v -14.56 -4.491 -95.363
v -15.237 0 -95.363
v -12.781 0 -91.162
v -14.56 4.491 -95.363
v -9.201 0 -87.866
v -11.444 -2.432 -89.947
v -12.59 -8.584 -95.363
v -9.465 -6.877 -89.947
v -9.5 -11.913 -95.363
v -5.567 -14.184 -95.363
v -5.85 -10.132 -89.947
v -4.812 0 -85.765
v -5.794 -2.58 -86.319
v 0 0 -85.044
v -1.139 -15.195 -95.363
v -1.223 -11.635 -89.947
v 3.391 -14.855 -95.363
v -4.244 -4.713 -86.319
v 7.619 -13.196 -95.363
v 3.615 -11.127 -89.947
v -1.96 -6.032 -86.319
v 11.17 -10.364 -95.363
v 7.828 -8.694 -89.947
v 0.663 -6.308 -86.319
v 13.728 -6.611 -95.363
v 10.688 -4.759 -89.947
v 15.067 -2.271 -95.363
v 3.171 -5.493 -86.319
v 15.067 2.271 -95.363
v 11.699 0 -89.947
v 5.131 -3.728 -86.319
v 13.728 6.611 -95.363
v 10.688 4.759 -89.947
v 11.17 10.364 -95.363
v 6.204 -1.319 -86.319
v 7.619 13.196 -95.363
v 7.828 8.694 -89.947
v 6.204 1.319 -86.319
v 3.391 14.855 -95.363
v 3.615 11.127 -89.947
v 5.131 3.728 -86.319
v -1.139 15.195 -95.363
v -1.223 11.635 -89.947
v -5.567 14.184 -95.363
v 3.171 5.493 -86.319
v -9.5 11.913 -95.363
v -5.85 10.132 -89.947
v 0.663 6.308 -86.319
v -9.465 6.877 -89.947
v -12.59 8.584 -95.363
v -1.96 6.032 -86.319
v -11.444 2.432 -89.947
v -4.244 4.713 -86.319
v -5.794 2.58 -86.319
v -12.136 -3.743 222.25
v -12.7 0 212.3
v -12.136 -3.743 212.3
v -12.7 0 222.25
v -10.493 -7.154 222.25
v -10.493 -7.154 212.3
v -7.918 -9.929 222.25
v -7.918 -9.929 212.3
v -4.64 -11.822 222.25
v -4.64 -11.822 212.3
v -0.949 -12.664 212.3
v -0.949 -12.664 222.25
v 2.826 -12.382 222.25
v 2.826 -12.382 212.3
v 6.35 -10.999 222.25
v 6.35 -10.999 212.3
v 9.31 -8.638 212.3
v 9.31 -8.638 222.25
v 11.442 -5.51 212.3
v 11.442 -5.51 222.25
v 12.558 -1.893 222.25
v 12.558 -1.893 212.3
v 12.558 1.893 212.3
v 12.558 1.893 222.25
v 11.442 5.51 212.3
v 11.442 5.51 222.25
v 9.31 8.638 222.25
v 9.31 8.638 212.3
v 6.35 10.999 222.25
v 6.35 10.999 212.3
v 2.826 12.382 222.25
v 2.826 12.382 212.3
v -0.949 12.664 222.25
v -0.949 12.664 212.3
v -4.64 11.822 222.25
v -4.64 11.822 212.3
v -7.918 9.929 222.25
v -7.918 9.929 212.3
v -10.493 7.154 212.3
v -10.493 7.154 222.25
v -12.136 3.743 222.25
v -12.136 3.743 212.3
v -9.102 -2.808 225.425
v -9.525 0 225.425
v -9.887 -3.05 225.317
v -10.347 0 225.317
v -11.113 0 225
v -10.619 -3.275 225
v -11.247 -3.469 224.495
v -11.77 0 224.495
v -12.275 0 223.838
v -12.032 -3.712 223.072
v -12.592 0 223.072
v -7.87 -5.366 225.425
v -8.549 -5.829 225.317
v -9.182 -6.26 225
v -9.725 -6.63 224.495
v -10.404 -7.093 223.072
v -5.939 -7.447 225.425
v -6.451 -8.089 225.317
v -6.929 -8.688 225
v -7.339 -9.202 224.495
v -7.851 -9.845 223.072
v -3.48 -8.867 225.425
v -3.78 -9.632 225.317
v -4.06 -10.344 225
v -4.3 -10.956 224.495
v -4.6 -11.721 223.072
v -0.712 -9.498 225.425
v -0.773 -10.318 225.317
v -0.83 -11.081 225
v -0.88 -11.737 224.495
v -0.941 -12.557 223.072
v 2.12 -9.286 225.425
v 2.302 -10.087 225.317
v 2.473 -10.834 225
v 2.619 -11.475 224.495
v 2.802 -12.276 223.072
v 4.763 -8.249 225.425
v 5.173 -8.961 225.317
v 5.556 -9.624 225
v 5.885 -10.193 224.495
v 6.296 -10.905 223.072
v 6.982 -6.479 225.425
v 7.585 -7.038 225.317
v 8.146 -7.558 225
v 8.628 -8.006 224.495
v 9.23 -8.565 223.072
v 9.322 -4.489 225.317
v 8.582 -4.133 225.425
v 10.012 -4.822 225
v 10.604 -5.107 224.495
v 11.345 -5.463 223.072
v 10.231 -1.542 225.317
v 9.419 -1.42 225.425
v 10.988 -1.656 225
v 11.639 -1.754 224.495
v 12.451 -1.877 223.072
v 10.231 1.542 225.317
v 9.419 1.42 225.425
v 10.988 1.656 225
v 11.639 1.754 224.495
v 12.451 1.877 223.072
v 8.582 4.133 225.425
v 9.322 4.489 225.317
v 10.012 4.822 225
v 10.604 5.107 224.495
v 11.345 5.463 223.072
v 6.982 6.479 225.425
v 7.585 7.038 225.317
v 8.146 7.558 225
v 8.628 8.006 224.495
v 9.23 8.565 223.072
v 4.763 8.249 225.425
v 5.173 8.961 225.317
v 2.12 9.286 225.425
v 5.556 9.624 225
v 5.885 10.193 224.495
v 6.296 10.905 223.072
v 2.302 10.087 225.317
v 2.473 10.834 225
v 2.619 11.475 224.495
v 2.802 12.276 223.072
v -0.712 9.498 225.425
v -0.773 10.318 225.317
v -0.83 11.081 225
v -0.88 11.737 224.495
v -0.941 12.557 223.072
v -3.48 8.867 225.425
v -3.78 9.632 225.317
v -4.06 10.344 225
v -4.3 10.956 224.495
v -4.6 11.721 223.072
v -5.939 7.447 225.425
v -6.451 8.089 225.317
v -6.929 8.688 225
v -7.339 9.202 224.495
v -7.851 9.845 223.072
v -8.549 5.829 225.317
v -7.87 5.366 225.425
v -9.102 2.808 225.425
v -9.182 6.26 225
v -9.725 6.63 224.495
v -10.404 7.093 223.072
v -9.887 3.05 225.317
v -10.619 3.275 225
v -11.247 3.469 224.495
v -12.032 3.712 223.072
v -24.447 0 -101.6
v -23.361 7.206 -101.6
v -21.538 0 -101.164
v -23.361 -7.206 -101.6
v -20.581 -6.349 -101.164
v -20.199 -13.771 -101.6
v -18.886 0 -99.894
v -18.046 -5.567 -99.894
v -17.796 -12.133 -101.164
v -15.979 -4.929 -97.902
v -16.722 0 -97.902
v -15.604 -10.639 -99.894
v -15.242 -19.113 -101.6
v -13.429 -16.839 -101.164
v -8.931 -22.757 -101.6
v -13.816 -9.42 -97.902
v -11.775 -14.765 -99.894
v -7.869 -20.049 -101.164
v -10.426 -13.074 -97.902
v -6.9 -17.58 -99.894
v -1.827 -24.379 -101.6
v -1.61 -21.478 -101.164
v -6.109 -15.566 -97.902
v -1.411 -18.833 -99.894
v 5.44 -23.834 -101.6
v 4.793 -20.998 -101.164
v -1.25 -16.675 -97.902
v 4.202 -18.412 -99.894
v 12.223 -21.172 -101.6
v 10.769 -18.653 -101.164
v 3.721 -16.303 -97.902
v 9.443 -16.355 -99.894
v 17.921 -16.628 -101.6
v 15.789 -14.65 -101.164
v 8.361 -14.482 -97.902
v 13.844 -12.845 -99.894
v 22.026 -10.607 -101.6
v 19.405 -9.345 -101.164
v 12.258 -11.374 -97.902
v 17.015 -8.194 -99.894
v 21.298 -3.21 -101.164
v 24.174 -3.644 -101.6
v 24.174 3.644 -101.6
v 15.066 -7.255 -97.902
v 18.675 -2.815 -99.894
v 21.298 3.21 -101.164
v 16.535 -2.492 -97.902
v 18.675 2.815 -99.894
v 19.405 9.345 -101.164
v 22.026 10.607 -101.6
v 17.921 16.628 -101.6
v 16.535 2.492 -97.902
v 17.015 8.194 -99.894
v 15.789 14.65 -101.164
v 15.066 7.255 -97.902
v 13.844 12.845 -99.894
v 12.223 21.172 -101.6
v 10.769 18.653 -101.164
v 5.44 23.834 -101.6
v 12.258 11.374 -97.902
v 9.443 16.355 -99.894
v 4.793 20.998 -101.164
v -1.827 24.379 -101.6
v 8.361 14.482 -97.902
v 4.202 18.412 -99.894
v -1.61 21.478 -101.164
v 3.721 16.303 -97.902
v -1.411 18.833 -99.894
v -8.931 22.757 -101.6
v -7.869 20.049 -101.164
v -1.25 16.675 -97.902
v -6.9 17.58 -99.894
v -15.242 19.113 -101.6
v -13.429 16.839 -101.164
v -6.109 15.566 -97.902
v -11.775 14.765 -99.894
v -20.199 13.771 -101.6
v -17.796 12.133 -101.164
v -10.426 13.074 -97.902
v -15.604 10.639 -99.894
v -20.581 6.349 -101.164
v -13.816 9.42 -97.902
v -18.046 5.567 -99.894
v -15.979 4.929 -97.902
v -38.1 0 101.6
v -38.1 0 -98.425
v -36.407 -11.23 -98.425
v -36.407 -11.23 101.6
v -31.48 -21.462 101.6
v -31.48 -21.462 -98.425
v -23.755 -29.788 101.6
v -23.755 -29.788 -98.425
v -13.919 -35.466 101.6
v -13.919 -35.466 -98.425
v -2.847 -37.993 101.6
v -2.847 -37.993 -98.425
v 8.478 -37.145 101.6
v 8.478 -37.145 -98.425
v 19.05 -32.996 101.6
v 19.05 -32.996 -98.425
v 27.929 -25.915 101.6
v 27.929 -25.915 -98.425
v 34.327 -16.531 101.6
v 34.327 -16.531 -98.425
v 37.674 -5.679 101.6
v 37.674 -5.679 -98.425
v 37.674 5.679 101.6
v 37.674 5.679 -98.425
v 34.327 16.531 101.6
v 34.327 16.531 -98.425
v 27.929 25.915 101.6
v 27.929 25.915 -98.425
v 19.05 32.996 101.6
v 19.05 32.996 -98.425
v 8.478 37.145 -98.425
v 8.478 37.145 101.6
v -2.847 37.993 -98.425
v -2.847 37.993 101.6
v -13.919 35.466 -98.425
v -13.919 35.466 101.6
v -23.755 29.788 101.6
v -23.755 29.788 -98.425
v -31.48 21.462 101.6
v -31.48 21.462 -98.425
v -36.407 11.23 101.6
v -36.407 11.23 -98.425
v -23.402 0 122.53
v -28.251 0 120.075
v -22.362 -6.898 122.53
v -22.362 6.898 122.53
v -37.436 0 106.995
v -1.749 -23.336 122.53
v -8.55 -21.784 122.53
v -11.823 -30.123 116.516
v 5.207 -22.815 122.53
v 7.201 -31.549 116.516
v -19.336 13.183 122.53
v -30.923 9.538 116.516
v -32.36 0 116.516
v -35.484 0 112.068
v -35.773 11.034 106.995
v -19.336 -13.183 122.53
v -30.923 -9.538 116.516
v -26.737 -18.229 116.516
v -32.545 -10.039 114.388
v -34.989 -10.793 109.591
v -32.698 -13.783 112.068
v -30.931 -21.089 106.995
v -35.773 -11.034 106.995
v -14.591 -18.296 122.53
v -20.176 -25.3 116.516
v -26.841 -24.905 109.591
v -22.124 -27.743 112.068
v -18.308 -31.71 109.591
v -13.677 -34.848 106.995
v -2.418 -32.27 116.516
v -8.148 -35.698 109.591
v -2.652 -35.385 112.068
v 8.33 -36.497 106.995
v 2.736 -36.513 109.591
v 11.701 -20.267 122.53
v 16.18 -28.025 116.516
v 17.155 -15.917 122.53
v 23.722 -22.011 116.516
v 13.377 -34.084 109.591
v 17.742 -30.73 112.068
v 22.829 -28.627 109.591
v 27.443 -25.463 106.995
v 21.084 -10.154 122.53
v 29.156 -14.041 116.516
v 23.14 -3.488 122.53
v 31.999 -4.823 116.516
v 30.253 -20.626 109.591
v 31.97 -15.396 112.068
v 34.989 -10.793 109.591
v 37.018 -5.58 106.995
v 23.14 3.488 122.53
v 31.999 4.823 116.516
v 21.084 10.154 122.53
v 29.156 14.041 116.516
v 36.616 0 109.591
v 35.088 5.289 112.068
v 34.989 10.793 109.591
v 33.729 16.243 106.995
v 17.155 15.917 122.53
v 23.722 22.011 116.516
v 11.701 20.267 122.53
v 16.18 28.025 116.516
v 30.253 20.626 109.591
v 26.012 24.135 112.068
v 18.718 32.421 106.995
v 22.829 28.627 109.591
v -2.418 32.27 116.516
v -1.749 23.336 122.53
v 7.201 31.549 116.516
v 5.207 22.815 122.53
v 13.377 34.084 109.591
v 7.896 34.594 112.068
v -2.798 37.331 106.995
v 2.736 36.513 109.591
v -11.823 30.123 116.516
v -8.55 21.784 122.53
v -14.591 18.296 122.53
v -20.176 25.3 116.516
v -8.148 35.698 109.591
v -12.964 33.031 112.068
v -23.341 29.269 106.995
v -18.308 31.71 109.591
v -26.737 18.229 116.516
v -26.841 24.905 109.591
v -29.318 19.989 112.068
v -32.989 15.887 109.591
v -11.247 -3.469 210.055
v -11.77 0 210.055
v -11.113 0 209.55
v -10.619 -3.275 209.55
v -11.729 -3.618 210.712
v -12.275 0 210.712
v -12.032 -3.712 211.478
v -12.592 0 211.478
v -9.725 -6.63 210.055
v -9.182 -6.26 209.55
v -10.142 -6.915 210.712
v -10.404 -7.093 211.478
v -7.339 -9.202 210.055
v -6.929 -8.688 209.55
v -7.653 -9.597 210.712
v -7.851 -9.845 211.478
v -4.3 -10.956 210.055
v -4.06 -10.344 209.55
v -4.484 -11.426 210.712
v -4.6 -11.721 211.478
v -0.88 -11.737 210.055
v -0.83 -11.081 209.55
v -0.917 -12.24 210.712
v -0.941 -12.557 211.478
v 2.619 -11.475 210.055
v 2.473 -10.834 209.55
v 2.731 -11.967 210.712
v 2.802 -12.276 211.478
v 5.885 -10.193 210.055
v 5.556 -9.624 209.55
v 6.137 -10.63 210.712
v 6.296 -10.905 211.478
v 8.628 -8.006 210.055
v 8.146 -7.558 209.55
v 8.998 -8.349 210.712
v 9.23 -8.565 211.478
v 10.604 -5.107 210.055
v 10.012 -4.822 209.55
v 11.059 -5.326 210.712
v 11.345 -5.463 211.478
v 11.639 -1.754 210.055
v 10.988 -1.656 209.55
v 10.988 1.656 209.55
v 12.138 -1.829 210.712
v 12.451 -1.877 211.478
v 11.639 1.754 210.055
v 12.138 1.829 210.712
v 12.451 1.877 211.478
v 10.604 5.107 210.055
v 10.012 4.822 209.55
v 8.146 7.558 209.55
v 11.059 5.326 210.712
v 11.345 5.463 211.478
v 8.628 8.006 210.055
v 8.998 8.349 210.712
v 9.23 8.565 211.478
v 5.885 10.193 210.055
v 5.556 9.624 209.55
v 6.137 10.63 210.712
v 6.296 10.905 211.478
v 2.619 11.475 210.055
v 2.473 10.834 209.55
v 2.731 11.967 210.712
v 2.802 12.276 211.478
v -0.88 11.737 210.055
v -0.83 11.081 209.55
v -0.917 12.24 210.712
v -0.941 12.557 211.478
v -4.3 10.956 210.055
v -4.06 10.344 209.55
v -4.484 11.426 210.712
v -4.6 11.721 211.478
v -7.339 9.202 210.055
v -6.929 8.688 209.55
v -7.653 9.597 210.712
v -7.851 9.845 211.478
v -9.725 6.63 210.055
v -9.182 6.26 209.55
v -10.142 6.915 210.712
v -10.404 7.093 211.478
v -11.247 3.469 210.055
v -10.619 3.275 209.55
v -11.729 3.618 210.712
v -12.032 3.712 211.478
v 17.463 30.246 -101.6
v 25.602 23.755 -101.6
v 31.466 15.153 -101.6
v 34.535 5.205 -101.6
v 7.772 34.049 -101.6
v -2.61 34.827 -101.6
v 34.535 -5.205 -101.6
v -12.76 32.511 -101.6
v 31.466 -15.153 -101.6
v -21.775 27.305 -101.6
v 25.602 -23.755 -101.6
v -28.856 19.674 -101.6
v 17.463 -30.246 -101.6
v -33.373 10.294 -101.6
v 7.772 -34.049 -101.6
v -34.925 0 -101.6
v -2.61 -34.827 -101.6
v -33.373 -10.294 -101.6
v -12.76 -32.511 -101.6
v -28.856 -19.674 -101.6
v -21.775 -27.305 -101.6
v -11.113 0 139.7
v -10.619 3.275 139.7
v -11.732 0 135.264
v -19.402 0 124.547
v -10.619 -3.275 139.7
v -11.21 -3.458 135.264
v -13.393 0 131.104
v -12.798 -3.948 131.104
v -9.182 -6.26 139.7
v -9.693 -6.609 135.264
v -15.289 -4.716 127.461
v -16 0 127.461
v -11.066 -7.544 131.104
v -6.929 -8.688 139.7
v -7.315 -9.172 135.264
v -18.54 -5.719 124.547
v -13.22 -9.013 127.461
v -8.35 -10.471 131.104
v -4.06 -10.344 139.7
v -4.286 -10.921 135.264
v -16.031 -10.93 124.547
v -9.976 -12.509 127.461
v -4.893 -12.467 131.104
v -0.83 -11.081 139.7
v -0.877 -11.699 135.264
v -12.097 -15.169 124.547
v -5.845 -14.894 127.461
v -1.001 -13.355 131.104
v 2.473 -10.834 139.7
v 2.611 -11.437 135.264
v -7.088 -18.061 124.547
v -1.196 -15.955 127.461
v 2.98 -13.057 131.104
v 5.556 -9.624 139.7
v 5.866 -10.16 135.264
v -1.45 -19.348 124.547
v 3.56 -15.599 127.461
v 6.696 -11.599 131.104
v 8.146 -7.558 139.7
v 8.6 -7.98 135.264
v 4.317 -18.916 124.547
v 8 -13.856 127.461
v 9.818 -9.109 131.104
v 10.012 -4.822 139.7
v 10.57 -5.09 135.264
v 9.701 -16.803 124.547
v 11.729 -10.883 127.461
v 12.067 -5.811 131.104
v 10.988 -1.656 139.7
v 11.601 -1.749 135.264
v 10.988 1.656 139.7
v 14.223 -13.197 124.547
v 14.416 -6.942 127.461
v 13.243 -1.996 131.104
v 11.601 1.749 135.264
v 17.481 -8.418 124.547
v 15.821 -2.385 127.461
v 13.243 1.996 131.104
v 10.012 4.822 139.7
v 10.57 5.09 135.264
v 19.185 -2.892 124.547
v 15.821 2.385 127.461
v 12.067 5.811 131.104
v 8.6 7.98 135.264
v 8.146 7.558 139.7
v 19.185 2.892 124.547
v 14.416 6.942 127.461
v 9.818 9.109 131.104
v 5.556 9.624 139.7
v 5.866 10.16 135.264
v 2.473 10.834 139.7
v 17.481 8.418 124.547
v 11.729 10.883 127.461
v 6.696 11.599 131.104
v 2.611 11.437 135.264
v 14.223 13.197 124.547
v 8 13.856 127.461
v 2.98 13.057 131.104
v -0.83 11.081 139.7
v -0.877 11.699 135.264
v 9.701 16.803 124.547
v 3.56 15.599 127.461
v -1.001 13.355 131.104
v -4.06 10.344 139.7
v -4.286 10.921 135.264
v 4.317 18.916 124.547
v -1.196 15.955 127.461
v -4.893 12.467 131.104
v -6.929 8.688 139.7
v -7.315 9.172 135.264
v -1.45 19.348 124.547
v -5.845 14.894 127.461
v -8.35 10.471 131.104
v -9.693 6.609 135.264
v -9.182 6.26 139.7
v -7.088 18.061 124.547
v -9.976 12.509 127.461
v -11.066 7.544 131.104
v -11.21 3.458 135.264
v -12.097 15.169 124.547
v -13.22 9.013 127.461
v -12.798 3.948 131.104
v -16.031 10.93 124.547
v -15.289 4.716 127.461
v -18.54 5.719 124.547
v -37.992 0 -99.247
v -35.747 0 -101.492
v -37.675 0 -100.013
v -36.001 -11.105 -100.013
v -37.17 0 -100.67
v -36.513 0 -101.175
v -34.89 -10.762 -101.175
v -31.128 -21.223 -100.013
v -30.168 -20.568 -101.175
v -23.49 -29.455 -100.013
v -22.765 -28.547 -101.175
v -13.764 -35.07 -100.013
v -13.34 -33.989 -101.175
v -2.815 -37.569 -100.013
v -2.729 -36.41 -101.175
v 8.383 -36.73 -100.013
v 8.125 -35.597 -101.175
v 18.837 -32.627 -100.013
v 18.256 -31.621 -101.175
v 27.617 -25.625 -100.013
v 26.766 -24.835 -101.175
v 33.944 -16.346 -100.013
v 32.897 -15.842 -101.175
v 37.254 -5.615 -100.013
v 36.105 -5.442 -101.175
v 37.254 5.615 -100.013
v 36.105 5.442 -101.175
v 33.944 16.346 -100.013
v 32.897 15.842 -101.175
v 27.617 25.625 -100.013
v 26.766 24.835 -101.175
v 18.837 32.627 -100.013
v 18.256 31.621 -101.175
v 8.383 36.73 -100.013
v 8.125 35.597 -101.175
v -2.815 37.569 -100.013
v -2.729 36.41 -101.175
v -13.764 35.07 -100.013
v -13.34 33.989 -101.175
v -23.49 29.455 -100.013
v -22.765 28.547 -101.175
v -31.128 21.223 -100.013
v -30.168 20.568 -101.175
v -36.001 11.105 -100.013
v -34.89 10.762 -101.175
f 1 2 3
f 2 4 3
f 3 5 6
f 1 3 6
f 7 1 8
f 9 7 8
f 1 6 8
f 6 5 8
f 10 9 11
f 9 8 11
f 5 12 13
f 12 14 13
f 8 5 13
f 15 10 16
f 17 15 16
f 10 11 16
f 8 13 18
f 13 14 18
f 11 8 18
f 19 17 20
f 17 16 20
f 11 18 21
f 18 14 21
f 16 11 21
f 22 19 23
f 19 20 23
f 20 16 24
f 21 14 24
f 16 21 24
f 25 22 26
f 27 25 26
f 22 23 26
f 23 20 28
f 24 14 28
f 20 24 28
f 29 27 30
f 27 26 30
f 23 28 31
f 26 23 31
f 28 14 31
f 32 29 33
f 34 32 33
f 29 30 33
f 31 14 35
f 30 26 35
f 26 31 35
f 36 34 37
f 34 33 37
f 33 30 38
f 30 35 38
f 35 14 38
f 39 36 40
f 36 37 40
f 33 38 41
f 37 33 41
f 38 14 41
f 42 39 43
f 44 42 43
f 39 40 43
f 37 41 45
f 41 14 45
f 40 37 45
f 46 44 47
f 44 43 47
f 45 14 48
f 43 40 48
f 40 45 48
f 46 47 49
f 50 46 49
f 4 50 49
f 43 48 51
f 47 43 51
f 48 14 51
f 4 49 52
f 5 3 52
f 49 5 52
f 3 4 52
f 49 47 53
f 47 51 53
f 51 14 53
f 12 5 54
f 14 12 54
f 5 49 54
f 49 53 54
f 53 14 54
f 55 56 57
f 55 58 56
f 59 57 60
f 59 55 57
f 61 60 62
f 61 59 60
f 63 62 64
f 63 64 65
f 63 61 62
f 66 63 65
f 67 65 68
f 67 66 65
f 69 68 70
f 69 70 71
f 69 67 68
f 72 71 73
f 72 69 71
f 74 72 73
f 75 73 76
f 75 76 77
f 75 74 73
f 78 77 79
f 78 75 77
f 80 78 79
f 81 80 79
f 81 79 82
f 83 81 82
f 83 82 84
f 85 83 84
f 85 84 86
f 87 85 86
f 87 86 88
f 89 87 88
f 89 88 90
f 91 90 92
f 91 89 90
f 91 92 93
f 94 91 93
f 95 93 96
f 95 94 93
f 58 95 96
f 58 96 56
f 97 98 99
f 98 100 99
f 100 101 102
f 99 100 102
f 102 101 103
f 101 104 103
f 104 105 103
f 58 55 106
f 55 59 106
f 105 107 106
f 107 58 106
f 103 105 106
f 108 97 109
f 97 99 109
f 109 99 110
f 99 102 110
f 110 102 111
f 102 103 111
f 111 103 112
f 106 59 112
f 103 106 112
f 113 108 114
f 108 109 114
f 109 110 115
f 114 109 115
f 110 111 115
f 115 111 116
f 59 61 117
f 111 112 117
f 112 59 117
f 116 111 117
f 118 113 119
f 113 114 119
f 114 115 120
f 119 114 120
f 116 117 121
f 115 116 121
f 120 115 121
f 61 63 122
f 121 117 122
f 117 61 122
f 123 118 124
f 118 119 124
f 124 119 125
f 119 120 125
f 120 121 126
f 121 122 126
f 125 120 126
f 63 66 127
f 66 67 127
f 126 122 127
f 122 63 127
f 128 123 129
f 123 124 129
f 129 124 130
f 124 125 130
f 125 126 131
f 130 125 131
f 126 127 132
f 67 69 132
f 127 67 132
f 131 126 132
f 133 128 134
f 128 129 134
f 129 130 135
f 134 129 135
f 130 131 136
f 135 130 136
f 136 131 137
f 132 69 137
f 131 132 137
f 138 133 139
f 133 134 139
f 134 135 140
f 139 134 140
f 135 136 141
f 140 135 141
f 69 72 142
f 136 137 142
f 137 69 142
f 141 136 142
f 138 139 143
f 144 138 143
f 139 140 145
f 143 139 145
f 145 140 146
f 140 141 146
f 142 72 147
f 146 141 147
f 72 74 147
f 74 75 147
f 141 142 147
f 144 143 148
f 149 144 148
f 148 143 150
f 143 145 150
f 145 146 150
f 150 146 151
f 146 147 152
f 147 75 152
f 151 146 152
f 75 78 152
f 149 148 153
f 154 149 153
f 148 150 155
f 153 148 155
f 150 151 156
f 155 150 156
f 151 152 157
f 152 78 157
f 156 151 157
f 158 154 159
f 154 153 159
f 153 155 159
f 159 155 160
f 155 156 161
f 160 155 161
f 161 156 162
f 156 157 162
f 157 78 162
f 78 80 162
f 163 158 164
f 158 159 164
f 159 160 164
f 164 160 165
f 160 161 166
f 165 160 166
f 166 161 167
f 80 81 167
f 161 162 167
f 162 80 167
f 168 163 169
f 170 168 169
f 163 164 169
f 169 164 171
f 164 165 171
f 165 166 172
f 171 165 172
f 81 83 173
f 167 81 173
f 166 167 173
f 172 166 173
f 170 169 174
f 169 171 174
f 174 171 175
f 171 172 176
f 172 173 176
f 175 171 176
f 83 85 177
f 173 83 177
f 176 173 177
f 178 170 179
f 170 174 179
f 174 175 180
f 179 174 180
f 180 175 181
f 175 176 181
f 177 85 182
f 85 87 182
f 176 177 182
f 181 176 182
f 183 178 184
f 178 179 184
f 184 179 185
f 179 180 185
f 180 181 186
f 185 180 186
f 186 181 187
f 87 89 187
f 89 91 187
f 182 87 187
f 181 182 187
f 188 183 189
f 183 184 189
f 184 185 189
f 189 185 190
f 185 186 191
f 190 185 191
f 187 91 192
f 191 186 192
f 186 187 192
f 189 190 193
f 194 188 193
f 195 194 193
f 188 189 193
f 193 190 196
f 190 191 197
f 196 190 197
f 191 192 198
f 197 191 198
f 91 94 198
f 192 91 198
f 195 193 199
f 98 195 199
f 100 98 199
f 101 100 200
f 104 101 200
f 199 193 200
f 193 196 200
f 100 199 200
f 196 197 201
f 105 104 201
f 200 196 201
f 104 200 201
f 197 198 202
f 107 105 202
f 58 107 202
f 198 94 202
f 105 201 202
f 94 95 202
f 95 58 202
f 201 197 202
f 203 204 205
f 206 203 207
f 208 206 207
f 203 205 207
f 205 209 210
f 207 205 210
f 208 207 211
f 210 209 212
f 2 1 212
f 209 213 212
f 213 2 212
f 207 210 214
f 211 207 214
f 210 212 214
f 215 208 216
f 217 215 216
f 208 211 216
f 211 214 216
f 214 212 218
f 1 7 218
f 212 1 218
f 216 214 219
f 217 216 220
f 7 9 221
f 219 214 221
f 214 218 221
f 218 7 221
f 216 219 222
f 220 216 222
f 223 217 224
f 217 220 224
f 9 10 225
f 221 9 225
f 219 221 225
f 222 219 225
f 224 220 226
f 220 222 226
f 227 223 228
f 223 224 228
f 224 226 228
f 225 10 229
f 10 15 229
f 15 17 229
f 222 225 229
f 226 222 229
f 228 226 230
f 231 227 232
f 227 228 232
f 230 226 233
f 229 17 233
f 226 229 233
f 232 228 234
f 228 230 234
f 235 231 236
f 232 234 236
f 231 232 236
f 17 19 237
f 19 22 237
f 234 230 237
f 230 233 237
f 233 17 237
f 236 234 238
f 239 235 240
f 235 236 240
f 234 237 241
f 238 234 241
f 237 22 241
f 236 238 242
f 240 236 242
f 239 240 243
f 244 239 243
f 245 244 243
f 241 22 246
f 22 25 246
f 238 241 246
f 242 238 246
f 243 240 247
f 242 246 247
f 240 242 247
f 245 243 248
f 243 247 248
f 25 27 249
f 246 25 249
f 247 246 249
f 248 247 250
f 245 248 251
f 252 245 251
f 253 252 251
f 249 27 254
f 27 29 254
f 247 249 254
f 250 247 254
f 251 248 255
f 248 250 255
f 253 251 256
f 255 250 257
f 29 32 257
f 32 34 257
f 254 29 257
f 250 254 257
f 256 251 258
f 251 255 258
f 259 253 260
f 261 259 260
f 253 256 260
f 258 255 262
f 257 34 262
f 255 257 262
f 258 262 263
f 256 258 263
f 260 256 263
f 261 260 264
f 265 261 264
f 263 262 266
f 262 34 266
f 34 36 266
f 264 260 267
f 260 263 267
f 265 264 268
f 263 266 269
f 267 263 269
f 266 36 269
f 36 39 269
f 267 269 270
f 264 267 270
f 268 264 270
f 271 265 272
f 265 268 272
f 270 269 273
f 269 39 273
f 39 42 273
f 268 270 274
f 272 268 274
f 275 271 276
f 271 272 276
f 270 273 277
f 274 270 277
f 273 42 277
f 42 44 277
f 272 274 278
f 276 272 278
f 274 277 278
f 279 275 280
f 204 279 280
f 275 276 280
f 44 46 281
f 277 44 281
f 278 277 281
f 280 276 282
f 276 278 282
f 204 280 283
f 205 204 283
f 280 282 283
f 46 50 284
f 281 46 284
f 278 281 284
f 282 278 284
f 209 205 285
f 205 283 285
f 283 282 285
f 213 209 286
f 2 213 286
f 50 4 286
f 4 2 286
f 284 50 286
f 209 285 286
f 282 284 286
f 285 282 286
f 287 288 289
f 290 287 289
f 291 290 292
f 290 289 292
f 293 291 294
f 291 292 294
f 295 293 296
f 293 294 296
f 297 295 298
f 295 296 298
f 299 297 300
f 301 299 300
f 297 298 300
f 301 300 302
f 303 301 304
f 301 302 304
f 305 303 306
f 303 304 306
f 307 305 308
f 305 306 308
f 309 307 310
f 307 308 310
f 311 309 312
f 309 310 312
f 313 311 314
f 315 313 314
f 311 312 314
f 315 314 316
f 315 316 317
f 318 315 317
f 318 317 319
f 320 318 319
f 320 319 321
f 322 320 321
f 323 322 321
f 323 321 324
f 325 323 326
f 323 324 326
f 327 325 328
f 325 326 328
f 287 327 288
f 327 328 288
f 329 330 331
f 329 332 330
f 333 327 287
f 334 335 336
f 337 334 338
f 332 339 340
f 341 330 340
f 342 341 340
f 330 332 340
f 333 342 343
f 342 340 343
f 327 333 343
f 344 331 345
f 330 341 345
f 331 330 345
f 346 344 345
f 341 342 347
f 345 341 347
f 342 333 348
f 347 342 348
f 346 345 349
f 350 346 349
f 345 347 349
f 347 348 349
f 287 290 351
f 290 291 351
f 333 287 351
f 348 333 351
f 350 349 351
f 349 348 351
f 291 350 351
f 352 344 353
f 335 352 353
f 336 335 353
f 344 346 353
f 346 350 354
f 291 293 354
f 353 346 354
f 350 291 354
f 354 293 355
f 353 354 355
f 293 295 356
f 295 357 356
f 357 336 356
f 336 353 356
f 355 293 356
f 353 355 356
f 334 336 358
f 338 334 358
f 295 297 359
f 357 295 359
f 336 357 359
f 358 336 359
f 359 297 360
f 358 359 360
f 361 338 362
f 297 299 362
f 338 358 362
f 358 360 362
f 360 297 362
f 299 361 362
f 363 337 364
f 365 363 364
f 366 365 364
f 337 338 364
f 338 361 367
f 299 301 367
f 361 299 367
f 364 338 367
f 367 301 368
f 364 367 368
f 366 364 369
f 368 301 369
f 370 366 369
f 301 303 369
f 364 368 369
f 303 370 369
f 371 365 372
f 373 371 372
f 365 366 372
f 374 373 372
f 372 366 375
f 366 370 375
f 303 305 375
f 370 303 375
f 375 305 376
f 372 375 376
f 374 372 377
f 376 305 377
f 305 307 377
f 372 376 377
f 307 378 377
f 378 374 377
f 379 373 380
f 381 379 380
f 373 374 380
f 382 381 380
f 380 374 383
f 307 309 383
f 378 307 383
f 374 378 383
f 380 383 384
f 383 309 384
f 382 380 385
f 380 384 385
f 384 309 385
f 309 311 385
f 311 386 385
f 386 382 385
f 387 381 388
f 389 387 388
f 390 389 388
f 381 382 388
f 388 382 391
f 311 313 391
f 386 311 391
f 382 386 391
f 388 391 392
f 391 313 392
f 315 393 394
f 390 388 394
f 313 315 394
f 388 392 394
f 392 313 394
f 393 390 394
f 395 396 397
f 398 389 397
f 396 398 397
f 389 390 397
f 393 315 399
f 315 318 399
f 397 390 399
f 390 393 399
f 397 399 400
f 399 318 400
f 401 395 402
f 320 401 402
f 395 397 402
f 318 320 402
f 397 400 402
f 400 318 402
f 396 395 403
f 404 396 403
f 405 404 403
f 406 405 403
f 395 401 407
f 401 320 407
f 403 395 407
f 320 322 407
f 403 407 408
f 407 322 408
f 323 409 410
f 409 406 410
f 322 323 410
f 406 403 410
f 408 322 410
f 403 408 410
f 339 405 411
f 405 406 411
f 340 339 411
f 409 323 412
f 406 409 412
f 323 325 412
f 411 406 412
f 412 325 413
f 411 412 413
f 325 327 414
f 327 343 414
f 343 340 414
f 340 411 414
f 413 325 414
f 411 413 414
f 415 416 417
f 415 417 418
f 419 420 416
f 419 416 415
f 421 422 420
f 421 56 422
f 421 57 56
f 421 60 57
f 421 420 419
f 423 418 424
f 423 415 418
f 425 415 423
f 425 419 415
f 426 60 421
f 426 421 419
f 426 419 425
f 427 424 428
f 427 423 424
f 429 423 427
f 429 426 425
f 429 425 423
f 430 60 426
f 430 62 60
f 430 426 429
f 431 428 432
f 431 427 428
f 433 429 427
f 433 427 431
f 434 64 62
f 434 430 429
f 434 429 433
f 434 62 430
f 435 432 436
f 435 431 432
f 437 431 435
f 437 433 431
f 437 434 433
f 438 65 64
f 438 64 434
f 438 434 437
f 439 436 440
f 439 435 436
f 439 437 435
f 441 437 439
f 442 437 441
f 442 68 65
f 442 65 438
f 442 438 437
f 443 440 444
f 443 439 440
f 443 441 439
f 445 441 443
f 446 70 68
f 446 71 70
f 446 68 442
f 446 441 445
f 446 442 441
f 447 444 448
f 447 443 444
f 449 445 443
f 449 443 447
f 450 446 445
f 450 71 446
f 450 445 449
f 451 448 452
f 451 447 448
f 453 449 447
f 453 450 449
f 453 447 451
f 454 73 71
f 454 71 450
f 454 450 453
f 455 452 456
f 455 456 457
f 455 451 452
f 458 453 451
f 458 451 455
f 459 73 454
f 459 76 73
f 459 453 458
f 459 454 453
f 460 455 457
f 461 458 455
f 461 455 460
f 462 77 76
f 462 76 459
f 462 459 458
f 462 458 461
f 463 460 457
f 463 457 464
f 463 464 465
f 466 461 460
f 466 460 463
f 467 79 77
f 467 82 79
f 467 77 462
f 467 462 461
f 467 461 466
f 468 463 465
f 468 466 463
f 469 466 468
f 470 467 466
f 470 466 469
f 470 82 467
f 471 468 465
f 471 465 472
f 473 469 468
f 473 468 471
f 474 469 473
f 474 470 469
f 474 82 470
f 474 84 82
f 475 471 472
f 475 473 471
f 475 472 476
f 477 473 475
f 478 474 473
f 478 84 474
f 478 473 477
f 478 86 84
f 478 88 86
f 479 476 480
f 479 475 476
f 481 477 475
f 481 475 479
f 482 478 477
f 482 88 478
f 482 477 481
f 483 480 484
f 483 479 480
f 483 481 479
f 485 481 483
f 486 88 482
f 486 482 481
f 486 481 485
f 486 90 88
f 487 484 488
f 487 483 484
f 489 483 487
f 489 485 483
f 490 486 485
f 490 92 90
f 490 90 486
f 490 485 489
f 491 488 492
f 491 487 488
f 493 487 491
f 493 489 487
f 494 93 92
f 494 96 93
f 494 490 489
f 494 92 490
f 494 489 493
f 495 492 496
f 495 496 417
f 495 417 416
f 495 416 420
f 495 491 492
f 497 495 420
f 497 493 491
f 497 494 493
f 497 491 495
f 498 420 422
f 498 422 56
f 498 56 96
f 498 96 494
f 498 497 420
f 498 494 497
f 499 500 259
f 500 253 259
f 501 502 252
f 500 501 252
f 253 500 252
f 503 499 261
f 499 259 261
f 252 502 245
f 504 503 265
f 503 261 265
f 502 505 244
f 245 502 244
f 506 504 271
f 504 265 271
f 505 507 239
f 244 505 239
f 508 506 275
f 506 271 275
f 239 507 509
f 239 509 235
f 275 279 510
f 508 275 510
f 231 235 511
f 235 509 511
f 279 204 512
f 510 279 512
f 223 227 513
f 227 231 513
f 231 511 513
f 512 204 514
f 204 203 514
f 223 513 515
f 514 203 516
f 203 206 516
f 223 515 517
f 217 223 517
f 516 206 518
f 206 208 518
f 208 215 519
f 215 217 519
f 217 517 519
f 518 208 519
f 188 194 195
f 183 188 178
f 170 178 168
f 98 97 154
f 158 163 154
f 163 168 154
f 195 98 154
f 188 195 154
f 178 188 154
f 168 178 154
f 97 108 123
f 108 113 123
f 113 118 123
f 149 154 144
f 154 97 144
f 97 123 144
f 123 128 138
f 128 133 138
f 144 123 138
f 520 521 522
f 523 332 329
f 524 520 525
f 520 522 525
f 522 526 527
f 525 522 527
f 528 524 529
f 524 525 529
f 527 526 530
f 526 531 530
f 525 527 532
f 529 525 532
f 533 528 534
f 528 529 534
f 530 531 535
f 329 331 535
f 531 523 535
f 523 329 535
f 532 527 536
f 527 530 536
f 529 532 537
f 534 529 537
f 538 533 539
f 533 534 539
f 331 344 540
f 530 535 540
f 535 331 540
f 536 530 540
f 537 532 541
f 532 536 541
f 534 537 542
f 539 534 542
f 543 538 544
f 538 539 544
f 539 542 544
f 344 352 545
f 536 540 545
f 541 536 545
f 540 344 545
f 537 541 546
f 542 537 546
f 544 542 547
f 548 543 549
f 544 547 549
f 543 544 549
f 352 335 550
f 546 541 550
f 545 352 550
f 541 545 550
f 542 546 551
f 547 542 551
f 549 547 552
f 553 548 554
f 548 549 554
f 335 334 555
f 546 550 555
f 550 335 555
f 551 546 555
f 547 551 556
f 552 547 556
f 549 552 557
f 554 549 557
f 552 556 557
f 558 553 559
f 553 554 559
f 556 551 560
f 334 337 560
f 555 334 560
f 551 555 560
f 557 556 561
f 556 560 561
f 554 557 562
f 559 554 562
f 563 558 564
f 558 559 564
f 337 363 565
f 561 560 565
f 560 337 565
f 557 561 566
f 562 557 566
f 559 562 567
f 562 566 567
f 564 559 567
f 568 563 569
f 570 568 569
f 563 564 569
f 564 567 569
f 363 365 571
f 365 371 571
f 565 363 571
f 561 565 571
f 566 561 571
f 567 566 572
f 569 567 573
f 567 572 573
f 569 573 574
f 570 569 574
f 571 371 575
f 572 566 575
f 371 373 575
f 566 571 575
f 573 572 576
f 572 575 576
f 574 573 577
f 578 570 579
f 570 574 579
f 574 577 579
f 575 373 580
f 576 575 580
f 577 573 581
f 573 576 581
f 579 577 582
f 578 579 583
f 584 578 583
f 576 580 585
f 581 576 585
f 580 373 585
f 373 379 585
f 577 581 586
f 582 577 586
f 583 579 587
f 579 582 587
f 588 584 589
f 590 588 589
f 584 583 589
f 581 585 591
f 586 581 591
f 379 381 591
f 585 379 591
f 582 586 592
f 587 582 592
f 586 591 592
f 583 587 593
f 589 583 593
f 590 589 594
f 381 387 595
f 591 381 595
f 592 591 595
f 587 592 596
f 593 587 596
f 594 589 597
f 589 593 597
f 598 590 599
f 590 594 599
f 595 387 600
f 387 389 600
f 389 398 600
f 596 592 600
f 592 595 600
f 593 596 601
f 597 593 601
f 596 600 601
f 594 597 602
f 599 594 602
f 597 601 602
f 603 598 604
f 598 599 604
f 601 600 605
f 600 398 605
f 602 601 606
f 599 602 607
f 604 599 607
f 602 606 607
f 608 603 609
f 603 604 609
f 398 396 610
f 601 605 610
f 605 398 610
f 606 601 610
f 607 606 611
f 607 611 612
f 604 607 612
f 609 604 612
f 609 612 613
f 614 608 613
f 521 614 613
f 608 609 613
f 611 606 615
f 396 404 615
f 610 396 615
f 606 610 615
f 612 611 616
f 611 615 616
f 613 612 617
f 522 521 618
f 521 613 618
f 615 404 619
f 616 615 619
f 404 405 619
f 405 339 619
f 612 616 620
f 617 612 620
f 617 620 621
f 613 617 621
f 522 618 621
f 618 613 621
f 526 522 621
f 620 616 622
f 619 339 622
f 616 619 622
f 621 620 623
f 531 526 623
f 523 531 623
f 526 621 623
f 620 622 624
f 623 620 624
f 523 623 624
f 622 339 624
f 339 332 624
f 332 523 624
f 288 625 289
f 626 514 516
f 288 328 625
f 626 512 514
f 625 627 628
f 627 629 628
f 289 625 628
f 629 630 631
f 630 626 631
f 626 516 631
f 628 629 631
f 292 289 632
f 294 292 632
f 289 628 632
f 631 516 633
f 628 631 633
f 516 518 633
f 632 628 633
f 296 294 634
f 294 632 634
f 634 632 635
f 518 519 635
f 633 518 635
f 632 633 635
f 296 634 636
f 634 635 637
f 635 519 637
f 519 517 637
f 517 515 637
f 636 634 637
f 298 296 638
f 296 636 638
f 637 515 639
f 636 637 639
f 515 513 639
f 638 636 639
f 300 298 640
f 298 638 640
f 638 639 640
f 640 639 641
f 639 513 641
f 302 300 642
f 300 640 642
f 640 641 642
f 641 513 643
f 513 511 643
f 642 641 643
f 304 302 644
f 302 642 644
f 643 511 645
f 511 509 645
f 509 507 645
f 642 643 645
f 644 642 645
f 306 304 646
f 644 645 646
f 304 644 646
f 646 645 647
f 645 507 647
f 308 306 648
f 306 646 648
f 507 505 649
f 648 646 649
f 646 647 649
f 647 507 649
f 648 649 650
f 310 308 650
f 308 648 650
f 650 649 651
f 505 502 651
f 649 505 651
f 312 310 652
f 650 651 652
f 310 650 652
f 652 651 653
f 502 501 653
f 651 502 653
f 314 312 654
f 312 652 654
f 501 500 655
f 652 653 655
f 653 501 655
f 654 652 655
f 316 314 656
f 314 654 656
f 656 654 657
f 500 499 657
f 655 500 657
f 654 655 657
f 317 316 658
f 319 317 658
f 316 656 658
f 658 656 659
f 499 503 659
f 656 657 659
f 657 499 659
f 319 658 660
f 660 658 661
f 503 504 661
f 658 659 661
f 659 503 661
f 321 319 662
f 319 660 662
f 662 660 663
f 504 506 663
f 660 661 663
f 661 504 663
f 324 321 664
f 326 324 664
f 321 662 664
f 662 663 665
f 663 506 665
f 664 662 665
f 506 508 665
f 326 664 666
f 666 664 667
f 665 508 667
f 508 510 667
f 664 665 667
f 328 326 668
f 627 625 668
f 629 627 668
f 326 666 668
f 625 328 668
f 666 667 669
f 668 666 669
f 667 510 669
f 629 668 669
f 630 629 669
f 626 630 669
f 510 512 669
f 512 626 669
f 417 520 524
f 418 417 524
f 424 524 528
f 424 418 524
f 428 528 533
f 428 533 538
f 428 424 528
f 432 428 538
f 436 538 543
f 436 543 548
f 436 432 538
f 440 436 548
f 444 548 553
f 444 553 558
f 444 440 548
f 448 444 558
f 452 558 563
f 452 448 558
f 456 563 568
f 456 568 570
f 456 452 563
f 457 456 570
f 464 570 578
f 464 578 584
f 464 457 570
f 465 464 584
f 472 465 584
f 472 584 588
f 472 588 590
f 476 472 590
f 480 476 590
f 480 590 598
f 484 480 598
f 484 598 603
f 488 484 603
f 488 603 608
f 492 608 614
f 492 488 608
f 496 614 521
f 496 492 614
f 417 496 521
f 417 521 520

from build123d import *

# Parameters (mm, degrees)
F0_W   = 1.5875
F0_H   = 15.875
F0_W_2 = 11.1125
F0_H_2 = 69.85


# Not quite as in the source:
# - a fillet or chamfer that OpenCascade refuses, or shapes differently, is made with other operations: its cross-section is extruded or revolved along the edge and cut away or added


with BuildPart() as f1:
    # F0 (on Front) → F1 (revolve)
    with BuildSketch(Plane.XZ):
        with Locations((-11.90625, 217.4875)):
            Rectangle(F0_W, F0_H)
        with Locations((-5.55625, 217.4875)):
            Rectangle(F0_W_2, F0_H)
        with Locations((-5.55625, 174.625)):
            Rectangle(F0_W_2, F0_H_2)
        with BuildLine():
            Line((-38.1, 101.6), (0, 101.6))
            Line((0, 101.6), (0, 139.7))
            Line((0, 139.7), (-11.1125, 139.7))
            ThreePointArc((-11.1125, 139.7), (-14.586457312, 129.203622534), (-23.4018713236, 122.5304827094))
            ThreePointArc((-23.4018713236, 122.5304827094), (-34.0584362623, 114.387885801), (-38.1, 101.6))
        make_face()
        with BuildLine():
            Line((0, -85.043540958), (0, 101.6))
            Line((0, 101.6), (-38.1, 101.6))
            Line((-38.1, 101.6), (-38.1, -101.6))
            Line((-38.1, -101.6), (-24.4468970238, -101.6))
            ThreePointArc((-24.4468970238, -101.6), (-18.8855290947, -99.8940128678), (-15.2374166451, -95.3629554974))
            ThreePointArc((-15.2374166451, -95.3629554974), (-9.2014833377, -87.8661580499), (0, -85.043540958))
        make_face()
    revolve(axis=Axis((0, 0, 70.190729521), (0, 0, 1)))

    # F2: fillet of radius 3.175 on 3 edges, made by hand

    # F2_s1 → F2_t2 (revolve, cut)
    with BuildSketch(Plane.XZ):
        with BuildLine():
            ThreePointArc((-38.1, -98.425), (-37.1700640303, -100.6700640303), (-34.925, -101.6))
            Line((-34.925, -101.6), (-34.925, -101.6635))
            Line((-34.925, -101.6635), (-38.1635, -101.6635))
            Line((-38.1635, -101.6635), (-38.1635, -98.425))
            Line((-38.1635, -98.425), (-38.1, -98.425))
        make_face()
    revolve(axis=Axis((0, 0, -101.6), (0, 0, 1)), mode=Mode.SUBTRACT)

    # F2_s3 → F2_t4 (revolve, cut)
    with BuildSketch(Plane.XZ):
        with BuildLine():
            ThreePointArc((-9.525, 225.425), (-11.7700640303, 224.4950640303), (-12.7, 222.25))
            Line((-12.7, 222.25), (-12.7635, 222.25))
            Line((-12.7635, 222.25), (-12.7635, 225.4885))
            Line((-12.7635, 225.4885), (-9.525, 225.4885))
            Line((-9.525, 225.4885), (-9.525, 225.425))
        make_face()
    revolve(axis=Axis((0, 0, 225.425), (0, 0, 1)), mode=Mode.SUBTRACT)

    # F2_s5 → F2_t6 (revolve, cut)
    with BuildSketch(Plane.XZ):
        with BuildLine():
            ThreePointArc((-11.1125, 209.55), (-12.274630657, 210.712130657), (-12.7, 212.299630657))
            Line((-12.7, 212.299630657), (-12.7635, 212.299630657))
            Line((-12.7635, 212.299630657), (-12.7635, 209.55))
            Line((-12.7635, 209.55), (-12.7, 209.4865))
            ThreePointArc((-12.7, 209.4865), (-11.90625, 209.4865), (-11.14425, 209.4950073869))
            Line((-11.14425, 209.4950073869), (-11.1125, 209.55))
        make_face()
    revolve(axis=Axis((0, 0, 209.55), (0, 0, 1)), mode=Mode.SUBTRACT)


solid = f1.part
